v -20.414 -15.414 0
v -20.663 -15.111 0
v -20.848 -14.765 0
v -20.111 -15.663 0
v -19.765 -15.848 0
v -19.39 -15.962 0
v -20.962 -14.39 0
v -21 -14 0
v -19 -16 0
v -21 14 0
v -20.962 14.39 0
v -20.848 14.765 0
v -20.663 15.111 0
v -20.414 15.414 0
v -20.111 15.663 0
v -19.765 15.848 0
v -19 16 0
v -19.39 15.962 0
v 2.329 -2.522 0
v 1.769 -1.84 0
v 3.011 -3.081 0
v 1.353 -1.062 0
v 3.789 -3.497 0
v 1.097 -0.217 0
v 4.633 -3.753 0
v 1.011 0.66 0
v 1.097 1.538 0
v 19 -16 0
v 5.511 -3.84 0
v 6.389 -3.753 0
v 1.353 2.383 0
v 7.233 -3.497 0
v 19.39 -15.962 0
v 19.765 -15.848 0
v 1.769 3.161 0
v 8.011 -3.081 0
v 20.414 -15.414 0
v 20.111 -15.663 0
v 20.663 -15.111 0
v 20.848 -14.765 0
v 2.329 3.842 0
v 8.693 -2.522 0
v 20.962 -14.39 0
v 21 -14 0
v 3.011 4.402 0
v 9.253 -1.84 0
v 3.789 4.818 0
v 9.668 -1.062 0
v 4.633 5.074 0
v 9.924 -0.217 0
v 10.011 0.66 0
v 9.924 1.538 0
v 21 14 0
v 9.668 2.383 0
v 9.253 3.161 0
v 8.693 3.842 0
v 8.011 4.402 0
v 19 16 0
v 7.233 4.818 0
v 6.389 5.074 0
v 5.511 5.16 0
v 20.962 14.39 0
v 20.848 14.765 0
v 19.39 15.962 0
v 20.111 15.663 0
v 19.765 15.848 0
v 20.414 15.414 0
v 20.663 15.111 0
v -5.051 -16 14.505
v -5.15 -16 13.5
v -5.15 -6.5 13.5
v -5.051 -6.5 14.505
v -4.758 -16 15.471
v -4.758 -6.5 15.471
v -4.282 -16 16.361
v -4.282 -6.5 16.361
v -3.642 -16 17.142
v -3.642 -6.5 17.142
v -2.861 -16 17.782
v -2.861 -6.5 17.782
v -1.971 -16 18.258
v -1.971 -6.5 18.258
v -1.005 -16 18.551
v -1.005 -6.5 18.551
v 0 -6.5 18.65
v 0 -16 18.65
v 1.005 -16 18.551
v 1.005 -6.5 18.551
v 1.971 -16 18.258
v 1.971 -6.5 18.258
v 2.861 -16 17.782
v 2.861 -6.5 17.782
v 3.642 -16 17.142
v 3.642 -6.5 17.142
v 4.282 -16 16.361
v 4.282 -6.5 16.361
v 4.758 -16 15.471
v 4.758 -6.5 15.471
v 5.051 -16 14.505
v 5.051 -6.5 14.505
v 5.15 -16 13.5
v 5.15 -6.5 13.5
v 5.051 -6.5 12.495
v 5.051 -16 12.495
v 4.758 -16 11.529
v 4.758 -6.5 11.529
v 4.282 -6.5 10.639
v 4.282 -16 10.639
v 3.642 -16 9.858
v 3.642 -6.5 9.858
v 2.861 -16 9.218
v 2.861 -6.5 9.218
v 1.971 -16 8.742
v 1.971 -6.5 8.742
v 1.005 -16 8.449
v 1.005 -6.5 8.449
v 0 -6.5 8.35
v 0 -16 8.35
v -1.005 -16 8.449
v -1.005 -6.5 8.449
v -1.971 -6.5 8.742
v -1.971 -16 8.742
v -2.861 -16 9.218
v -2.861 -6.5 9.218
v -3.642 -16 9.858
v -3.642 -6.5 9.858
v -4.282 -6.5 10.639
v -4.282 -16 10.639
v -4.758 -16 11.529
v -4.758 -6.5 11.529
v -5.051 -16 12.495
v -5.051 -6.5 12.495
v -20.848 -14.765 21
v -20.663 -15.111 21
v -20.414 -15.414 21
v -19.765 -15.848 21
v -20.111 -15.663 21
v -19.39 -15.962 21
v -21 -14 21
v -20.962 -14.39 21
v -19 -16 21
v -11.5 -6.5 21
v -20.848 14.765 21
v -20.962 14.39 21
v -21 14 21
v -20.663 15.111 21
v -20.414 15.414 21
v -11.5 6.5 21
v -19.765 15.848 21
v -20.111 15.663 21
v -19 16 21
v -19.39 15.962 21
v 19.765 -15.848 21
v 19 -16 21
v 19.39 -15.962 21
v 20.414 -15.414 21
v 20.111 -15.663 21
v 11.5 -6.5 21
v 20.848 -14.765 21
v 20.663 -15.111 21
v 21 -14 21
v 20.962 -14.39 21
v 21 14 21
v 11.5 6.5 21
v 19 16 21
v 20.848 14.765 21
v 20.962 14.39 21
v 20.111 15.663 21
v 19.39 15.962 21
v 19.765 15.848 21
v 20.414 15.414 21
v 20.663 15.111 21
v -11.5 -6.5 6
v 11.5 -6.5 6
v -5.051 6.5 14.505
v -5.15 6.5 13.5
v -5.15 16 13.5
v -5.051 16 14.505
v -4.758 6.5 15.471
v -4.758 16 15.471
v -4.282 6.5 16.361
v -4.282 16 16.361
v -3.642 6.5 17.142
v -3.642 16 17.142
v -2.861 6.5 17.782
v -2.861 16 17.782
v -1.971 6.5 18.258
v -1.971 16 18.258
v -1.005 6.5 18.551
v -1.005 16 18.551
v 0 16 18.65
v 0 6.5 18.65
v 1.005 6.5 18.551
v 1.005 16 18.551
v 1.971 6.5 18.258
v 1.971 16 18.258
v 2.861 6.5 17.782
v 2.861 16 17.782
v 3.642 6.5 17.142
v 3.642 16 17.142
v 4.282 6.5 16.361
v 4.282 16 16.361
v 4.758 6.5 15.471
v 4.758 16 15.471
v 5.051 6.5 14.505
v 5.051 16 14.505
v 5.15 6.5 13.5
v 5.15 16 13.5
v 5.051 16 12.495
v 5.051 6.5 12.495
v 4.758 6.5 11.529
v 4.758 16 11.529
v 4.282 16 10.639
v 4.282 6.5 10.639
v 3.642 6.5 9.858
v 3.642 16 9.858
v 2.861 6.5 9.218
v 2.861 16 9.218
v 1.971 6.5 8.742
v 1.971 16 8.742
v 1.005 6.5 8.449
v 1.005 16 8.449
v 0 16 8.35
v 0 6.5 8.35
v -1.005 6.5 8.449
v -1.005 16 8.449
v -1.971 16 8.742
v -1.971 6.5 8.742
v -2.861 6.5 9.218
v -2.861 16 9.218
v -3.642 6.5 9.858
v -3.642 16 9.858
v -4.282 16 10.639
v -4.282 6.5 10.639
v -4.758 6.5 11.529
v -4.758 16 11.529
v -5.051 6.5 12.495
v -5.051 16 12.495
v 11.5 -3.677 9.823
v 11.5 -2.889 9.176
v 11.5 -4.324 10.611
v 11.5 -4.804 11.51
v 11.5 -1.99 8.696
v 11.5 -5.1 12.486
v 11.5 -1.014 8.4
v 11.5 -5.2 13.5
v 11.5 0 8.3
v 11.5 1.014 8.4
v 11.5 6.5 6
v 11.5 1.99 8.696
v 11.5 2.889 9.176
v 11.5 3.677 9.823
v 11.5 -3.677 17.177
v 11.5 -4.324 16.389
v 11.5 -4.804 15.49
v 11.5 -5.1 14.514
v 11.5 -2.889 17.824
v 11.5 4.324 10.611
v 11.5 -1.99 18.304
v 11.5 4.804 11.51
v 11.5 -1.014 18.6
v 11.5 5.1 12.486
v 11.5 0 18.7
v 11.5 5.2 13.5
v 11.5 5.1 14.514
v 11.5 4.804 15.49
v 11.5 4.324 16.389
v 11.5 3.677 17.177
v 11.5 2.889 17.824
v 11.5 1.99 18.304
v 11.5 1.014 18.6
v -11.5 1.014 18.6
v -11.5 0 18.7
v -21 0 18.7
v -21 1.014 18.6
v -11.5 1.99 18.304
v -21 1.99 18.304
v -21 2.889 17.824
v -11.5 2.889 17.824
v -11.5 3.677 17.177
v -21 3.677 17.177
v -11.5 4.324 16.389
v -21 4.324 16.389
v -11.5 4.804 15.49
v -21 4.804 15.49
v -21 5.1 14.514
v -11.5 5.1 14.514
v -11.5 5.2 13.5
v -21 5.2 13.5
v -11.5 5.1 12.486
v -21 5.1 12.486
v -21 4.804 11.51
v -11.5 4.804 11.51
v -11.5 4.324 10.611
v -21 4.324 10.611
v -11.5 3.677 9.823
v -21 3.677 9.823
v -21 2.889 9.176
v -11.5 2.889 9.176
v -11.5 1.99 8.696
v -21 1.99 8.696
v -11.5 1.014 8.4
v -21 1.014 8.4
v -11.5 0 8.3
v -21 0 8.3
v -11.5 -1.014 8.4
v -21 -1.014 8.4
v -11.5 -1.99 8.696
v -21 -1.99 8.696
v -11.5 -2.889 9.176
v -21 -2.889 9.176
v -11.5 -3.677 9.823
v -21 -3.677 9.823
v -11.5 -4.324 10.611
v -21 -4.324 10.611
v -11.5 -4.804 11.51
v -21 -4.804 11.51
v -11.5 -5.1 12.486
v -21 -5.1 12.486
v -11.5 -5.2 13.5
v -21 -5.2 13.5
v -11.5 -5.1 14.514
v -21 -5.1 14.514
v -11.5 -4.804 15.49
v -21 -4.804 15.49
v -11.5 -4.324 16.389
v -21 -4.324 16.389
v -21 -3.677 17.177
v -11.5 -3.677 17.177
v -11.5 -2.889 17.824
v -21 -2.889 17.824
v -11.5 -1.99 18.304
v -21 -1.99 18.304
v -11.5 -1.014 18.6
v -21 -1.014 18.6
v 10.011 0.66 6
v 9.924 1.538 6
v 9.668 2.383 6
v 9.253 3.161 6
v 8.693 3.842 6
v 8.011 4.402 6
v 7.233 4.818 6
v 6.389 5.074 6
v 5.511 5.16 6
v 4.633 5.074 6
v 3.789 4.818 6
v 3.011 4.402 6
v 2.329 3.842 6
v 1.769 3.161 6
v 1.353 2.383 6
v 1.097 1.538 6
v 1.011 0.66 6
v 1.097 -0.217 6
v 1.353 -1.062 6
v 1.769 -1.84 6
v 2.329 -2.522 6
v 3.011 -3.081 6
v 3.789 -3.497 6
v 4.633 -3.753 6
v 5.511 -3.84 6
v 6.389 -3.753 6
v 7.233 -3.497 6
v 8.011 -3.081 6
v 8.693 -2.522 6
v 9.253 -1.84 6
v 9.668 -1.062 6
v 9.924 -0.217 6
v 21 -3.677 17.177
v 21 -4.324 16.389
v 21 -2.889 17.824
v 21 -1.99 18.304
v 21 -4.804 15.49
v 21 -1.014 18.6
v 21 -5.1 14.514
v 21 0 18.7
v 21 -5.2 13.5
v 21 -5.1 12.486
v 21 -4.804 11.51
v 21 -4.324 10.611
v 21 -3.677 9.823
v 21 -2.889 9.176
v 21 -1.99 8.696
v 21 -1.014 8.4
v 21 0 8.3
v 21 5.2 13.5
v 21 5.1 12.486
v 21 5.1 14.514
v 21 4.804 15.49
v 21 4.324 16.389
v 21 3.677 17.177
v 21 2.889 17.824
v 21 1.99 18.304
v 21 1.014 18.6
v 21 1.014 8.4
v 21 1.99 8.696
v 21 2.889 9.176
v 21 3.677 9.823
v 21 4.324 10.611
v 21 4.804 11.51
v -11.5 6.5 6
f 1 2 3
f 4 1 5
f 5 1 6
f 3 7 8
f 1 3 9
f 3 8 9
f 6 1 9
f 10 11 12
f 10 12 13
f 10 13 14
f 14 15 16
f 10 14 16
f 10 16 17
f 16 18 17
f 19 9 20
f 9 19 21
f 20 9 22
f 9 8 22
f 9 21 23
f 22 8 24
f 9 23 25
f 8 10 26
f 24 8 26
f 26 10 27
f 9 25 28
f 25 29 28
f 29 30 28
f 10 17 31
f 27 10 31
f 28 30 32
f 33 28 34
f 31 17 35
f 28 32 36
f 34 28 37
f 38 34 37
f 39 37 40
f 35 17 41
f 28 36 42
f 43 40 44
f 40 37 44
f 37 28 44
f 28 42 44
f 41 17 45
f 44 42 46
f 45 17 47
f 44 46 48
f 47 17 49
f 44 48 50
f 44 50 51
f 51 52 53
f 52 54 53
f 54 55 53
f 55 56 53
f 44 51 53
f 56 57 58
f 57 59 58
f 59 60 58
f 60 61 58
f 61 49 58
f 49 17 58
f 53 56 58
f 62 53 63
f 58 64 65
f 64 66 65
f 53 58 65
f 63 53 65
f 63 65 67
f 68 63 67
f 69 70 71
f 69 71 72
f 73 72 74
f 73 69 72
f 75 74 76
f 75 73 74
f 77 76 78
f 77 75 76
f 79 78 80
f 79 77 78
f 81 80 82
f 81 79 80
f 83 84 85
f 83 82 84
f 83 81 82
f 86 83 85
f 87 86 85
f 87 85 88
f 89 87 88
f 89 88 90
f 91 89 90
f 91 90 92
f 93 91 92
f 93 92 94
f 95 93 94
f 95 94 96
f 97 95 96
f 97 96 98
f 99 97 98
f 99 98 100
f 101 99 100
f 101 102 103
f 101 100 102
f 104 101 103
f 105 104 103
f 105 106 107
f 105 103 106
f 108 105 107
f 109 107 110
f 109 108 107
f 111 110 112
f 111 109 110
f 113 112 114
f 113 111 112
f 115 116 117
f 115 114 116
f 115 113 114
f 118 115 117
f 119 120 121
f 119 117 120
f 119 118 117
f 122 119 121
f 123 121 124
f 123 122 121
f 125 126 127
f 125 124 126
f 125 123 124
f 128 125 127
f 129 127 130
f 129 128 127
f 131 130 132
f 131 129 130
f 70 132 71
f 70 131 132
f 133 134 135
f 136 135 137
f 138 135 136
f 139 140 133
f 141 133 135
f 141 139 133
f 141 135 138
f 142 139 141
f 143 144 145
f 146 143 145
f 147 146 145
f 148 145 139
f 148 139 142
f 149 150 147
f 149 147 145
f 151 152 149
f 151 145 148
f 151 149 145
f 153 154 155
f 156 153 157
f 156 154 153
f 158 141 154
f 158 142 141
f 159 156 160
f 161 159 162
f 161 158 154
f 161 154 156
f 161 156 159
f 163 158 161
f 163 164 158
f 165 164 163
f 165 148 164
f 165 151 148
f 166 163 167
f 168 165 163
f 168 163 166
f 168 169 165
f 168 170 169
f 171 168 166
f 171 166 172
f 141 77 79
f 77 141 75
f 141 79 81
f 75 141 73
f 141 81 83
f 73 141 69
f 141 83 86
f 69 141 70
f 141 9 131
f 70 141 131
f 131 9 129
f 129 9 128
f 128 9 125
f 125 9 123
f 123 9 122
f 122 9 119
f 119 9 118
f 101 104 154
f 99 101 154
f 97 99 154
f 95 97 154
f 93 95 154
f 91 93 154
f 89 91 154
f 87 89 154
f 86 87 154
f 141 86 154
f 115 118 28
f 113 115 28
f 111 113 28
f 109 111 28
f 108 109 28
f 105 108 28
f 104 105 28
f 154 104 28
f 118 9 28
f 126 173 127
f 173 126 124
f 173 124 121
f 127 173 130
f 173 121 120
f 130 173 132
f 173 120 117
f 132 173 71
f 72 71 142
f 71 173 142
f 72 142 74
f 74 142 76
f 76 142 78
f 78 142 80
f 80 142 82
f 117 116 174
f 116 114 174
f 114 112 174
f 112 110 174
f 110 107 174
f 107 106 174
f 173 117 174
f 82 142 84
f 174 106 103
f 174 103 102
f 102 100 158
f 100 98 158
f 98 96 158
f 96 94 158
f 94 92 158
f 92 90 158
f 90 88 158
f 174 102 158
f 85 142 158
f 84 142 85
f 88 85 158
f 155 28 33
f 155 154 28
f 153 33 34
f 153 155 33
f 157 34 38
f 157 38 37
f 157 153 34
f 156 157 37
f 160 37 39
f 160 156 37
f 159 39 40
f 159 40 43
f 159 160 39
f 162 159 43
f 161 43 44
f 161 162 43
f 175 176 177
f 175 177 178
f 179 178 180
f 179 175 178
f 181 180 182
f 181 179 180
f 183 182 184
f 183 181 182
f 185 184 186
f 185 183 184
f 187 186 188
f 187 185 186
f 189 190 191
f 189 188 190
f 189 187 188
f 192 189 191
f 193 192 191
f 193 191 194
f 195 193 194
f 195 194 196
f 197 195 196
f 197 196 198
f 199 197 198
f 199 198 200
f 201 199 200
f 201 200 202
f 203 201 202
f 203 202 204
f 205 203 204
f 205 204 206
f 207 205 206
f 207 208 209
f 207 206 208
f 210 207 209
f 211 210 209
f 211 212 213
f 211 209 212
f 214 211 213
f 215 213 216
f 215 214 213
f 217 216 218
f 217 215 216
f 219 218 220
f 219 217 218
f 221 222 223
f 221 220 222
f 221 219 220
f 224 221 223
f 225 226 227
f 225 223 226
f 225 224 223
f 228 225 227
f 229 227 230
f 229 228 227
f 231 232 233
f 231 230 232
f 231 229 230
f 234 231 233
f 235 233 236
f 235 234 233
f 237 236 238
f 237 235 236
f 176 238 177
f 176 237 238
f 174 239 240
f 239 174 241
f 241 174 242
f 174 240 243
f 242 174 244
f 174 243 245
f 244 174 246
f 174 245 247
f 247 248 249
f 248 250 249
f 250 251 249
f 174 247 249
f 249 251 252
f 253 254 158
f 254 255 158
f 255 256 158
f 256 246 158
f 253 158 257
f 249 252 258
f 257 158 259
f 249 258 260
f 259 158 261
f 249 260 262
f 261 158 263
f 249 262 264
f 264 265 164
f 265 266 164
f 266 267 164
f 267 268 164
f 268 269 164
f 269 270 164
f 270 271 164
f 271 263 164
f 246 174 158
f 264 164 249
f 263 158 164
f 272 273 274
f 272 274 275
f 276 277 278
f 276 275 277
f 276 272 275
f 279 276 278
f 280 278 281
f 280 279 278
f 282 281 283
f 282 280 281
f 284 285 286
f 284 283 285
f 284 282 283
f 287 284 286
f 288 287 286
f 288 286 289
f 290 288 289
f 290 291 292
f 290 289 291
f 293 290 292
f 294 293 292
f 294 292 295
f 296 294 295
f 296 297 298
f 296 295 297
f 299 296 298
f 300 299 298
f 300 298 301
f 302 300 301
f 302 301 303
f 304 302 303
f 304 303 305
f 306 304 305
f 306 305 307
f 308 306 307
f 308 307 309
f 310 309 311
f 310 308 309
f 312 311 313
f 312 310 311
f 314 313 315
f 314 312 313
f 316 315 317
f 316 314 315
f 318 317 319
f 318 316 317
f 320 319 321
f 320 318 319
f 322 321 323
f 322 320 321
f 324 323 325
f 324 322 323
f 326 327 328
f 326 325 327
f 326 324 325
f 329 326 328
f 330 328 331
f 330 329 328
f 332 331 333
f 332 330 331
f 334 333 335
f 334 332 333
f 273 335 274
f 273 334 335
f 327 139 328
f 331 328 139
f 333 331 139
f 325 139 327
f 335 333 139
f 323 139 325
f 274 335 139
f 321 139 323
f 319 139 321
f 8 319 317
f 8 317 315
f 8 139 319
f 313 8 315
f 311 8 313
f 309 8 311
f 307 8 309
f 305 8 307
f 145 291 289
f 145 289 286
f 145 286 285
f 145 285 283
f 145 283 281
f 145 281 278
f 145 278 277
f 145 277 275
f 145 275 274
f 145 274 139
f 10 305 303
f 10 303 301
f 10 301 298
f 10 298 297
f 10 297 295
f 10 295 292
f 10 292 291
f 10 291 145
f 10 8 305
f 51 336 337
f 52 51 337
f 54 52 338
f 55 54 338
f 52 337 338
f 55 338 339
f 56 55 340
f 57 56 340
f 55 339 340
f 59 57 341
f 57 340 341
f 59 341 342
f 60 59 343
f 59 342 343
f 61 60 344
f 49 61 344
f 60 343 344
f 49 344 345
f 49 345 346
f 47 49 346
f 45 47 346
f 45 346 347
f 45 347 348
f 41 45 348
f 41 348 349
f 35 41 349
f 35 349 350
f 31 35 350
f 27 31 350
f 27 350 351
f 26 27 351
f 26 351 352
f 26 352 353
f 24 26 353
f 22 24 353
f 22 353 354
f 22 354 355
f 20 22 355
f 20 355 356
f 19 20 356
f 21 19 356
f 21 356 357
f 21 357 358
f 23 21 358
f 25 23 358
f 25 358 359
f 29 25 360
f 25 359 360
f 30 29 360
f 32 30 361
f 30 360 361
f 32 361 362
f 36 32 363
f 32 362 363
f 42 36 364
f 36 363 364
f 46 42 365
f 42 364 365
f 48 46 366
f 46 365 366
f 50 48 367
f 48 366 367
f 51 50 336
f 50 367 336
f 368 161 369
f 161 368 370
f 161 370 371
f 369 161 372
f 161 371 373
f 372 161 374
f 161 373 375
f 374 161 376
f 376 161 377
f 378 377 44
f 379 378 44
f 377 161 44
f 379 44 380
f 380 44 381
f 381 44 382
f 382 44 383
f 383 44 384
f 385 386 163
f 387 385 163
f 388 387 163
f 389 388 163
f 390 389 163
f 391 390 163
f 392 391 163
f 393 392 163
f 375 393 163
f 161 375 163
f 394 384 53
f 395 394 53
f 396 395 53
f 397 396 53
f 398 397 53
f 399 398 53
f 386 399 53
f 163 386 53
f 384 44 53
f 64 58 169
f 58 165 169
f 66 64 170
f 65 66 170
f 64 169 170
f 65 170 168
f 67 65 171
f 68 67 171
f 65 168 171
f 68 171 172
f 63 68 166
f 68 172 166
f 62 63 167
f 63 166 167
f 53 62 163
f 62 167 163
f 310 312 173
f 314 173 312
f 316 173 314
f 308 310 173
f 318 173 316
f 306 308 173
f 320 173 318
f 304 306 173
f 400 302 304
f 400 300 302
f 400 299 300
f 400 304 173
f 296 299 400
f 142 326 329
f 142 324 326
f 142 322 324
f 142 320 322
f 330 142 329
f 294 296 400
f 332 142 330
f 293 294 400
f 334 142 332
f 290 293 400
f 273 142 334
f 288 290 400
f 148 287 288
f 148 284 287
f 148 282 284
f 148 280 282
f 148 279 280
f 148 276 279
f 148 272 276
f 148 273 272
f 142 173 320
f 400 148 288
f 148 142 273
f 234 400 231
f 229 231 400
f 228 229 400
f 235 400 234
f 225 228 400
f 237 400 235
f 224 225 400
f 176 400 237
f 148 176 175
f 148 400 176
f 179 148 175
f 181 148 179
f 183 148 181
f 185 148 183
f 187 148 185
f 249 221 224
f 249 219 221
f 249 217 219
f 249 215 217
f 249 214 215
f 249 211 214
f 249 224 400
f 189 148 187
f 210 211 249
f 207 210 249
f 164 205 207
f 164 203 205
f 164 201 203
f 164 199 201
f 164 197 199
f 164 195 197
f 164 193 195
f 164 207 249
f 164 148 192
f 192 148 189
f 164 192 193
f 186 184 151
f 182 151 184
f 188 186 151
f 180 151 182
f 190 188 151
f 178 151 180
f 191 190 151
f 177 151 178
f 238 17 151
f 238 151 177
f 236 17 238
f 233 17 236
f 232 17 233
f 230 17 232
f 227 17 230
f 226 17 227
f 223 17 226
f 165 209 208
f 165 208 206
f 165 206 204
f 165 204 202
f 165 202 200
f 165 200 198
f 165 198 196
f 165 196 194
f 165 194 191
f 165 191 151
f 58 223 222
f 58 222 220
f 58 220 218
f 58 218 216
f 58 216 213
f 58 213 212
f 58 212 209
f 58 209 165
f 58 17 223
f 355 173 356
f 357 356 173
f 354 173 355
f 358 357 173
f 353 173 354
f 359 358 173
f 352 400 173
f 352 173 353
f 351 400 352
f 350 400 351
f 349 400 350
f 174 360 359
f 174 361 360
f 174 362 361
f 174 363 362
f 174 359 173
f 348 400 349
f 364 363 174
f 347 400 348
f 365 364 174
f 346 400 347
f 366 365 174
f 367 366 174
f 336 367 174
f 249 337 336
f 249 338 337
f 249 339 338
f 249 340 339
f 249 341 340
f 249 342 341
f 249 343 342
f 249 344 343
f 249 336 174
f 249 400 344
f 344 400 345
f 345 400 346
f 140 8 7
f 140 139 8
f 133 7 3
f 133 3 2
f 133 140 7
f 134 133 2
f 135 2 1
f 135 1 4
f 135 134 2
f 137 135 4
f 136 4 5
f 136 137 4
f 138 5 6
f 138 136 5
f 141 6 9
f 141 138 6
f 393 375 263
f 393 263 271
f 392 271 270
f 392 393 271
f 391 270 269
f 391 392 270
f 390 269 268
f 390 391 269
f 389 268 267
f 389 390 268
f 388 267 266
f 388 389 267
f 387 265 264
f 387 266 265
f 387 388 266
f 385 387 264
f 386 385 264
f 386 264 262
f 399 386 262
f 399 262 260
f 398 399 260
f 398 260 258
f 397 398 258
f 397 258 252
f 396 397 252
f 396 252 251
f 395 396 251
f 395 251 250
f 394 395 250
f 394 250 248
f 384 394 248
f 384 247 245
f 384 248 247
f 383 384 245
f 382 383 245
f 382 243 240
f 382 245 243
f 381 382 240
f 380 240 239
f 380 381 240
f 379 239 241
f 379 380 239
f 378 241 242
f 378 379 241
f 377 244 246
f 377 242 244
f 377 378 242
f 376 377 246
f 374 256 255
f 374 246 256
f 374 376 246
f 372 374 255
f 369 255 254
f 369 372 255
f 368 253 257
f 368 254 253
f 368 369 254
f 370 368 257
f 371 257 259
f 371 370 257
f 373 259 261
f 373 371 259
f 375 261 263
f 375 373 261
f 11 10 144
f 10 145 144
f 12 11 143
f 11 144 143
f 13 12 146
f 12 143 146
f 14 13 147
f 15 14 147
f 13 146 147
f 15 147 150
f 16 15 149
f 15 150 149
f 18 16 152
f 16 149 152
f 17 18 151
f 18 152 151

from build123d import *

# Parameters (mm, degrees)
SKETCH1_W               = 42
SKETCH1_H               = 32
BOSS_EXTRUDE1_DEPTH     = 21
SKETCH2_W               = 23
SKETCH2_H               = 13
CUT_EXTRUDE1_DEPTH      = 15
SKETCH3_R               = 4.5
CUT_EXTRUDE2_DEPTH      = 31.364452901
CUT_EXTRUDE3_DEPTH      = 42.871828238
CUT_EXTRUDE3_DEPTH_BACK = 42.871828238
SKETCH4_R               = 5.2
CUT_EXTRUDE4_DEPTH      = 38.259227045
CUT_EXTRUDE4_DEPTH_BACK = 38.259227045
SKETCH5_R               = 5.15
FILLET1_R               = 2


with BuildPart() as part:
    # Sketch1 → Boss-Extrude1 (new body)
    with BuildSketch(Plane.XY):
        Rectangle(SKETCH1_W, SKETCH1_H)
    extrude(amount=BOSS_EXTRUDE1_DEPTH)

    # Sketch2 → Cut-Extrude1 (cut)
    with BuildSketch(Plane.XY.offset(21)):
        Rectangle(SKETCH2_W, SKETCH2_H)
    extrude(amount=-CUT_EXTRUDE1_DEPTH, mode=Mode.SUBTRACT)

    # Sketch3 → Cut-Extrude2 (cut, through all)
    with BuildSketch(Plane.XY.offset(6)):
        with Locations((5.510924595, 0.660459353)):
            Circle(SKETCH3_R)
    extrude(amount=-CUT_EXTRUDE2_DEPTH, mode=Mode.SUBTRACT)

    # Sketch4 → Cut-Extrude3 (cut, two sides: drawn at the far end of the back side and taken through both)
    with BuildSketch(Plane.ZY.offset(-11.5).offset(-CUT_EXTRUDE3_DEPTH_BACK)):
        with Locations((13.5, 0)):
            Circle(SKETCH4_R)
    extrude(amount=CUT_EXTRUDE3_DEPTH + CUT_EXTRUDE3_DEPTH_BACK, mode=Mode.SUBTRACT)

    # Sketch5 → Cut-Extrude4 (cut, two sides: drawn at the far end of the back side and taken through both)
    with BuildSketch(Plane(origin=(0, -6.5, 0), x_dir=(1, 0, 0), z_dir=(0, 1, 0)).offset(-CUT_EXTRUDE4_DEPTH_BACK)):
        with Locations(Location((0, -13.5, 0), (0, 0, 180))):
            Circle(SKETCH5_R)
    extrude(amount=CUT_EXTRUDE4_DEPTH + CUT_EXTRUDE4_DEPTH_BACK, mode=Mode.SUBTRACT)

    # Fillet1
    fillet1_edges = [part.edges().sort_by_distance(p)[0] for p in [
        (-21, 16, 10.5),
        (21, 16, 10.5),
        (21, -16, 10.5),
        (-21, -16, 10.5),
    ]]
    fillet(fillet1_edges, radius=FILLET1_R)


solid = part.part
